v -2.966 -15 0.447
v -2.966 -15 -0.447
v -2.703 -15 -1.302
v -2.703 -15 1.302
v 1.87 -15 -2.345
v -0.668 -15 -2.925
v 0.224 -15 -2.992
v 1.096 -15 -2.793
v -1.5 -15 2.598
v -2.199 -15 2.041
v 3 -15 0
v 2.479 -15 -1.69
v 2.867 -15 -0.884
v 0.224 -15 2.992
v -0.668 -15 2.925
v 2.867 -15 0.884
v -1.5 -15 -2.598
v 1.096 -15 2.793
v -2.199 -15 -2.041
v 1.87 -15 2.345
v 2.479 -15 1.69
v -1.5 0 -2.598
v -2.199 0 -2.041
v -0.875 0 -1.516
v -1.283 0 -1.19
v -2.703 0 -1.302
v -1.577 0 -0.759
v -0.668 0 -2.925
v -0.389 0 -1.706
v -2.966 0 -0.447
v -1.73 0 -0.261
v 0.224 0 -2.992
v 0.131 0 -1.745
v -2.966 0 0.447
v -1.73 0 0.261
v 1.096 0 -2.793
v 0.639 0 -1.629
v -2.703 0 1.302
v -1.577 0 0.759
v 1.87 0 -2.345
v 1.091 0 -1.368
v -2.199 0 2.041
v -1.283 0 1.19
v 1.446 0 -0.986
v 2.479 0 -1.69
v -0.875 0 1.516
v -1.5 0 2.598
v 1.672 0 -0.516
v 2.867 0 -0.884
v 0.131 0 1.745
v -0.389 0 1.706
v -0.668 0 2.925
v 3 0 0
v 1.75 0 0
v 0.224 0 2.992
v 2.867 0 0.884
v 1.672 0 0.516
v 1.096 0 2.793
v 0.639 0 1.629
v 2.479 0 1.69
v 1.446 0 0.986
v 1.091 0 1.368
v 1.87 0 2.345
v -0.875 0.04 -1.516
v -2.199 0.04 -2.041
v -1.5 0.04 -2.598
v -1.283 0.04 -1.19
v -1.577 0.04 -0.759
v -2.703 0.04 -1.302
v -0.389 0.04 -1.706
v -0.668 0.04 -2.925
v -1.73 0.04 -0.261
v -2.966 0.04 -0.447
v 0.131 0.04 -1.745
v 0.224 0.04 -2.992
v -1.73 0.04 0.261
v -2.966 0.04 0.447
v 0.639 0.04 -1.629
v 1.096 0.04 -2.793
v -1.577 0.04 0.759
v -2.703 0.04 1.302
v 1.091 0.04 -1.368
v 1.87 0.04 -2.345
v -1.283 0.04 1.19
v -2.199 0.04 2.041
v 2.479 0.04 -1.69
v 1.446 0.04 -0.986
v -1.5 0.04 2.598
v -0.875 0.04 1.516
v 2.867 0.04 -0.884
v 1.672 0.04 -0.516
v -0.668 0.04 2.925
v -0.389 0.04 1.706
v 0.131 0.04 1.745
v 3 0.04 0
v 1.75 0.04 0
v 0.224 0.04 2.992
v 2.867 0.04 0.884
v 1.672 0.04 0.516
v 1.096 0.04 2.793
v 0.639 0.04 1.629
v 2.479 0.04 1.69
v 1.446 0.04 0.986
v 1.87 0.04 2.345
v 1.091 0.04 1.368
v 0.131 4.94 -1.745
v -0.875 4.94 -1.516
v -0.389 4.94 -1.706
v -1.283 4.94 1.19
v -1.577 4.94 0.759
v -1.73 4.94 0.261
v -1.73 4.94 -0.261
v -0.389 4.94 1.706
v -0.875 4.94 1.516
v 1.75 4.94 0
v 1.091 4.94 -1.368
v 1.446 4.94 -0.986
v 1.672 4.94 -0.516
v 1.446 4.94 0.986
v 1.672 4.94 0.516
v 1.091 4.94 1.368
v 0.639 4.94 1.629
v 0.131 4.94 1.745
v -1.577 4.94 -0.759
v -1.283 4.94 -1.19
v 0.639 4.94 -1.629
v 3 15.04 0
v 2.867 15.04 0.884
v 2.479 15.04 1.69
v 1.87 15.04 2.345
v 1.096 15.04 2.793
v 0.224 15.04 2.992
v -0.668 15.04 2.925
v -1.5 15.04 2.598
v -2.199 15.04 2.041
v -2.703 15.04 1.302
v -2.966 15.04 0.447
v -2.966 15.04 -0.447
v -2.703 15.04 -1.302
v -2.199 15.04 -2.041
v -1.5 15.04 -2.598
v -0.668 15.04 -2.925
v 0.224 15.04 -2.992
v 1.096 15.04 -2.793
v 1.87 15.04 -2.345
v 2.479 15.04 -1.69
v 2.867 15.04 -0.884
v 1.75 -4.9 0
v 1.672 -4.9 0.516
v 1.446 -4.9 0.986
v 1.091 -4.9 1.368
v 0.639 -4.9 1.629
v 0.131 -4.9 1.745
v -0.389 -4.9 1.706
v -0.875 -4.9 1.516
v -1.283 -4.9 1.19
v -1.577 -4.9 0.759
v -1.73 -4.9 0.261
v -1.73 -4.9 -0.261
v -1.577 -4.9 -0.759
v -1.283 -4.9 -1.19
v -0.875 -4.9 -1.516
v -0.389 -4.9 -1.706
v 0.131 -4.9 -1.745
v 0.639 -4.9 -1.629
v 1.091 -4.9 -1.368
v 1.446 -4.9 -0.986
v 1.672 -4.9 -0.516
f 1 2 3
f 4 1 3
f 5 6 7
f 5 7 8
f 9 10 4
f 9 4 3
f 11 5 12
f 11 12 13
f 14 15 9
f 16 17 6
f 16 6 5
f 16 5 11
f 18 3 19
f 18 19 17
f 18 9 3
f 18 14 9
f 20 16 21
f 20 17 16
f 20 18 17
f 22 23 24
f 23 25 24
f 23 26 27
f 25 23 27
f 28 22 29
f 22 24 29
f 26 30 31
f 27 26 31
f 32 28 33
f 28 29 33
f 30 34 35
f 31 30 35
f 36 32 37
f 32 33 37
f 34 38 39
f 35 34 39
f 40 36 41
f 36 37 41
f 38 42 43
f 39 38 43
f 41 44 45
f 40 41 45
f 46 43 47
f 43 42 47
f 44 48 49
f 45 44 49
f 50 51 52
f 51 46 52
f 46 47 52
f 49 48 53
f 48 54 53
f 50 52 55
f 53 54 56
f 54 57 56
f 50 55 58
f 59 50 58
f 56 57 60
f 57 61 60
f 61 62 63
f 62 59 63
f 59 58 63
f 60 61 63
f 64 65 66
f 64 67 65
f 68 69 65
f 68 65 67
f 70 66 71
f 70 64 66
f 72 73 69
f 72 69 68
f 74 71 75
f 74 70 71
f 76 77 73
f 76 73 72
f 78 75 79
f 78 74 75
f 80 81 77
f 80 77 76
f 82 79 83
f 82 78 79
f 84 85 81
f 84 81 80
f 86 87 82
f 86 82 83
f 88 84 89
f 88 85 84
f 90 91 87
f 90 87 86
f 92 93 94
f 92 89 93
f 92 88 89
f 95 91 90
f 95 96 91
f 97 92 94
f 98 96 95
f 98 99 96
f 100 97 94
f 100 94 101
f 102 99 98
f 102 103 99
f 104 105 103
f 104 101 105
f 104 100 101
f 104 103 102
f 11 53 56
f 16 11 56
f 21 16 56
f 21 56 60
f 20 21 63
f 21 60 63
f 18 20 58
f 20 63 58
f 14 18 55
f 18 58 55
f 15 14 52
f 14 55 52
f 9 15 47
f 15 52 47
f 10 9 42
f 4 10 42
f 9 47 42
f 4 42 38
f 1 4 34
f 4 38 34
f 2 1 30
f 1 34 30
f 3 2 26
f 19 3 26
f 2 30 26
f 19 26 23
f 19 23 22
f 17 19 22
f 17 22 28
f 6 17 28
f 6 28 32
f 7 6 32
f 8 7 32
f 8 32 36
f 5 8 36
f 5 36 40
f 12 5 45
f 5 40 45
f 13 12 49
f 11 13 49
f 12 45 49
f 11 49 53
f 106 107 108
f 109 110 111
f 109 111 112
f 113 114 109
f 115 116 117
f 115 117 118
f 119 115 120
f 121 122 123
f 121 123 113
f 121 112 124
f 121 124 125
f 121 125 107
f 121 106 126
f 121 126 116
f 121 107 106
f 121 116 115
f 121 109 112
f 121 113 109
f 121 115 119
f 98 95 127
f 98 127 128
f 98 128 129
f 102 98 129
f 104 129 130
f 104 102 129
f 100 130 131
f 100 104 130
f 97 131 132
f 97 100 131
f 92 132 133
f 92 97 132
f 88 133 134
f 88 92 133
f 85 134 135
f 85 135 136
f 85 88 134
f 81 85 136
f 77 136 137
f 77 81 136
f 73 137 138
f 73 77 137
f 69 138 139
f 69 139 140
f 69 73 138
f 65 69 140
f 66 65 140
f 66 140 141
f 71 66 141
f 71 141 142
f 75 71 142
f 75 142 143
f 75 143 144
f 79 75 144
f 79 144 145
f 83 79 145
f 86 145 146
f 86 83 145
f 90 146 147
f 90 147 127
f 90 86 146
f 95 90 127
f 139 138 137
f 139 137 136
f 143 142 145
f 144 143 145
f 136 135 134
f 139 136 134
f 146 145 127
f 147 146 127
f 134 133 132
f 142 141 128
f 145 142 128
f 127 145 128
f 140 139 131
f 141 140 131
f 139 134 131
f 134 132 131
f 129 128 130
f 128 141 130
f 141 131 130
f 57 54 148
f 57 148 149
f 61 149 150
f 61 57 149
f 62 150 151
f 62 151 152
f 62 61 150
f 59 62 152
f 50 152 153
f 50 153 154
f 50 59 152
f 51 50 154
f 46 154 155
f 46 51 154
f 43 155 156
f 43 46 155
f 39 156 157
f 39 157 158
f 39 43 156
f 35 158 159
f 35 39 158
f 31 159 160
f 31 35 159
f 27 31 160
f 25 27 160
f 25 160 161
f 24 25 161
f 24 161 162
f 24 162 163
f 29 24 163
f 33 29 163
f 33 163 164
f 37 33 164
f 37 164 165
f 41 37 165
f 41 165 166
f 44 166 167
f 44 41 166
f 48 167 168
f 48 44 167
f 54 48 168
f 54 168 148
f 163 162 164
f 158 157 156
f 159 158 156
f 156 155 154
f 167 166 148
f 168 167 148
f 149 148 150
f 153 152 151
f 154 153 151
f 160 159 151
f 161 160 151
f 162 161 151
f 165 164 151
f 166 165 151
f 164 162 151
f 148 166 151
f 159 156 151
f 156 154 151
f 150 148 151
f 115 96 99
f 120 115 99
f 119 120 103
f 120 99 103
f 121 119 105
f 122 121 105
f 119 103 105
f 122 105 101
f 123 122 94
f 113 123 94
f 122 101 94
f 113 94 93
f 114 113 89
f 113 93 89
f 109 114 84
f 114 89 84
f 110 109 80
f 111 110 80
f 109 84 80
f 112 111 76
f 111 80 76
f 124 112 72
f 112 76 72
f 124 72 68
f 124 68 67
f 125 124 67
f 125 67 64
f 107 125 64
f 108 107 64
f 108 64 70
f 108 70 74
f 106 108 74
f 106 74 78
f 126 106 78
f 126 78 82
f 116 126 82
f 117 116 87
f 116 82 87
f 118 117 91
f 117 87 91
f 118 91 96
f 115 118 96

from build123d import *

# Parameters (mm, degrees)
F0_R     = 3
F0_R_2   = 1.75
F1_DEPTH = 15
F2_DEPTH = 4.9


with BuildPart() as f1:
    # F0 (on Front) → F1 (new body)
    with BuildSketch(Plane.XZ):
        Circle(F0_R)
        Circle(F0_R_2, mode=Mode.SUBTRACT)
        Circle(F0_R_2)
    extrude(amount=F1_DEPTH)

    # F0 (on Front) → F2 (cut)
    with BuildSketch(Plane.XZ):
        Circle(F0_R_2)
    extrude(amount=F2_DEPTH, mode=Mode.SUBTRACT)


with BuildPart() as f4_1:
    # F4: instance of F1
    add(f1.part.mirror(Plane.XZ.offset(-0.02)))


solid = Compound([f1.part, f4_1.part])
